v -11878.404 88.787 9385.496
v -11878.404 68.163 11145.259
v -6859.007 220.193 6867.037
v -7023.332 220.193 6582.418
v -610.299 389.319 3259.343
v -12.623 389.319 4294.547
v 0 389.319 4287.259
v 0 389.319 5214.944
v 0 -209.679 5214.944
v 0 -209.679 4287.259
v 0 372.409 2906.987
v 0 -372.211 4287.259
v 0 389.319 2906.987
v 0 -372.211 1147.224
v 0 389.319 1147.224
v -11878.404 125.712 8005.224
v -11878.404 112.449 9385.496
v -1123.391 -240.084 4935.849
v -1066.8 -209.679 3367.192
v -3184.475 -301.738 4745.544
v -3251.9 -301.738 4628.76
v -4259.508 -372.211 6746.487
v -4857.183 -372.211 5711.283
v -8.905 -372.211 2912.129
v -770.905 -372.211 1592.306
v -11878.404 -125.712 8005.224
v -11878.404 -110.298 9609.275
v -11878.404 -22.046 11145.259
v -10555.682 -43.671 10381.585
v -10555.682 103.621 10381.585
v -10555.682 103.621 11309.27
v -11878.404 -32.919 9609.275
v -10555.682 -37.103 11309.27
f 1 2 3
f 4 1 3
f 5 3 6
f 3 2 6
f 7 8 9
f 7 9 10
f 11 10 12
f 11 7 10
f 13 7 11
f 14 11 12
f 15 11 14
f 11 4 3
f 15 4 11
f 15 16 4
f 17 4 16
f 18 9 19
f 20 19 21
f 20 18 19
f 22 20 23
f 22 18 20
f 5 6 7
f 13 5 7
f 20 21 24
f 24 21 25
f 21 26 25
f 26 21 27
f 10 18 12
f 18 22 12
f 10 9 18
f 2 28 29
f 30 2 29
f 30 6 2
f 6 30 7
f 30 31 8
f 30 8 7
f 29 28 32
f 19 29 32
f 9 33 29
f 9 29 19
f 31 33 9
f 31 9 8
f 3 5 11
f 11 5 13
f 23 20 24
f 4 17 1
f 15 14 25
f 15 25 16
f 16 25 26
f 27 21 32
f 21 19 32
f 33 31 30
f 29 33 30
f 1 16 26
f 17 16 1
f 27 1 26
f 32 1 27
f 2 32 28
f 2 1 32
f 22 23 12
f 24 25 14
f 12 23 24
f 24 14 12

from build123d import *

# Parameters (mm, degrees)
BOSS_EXTRUDE1_START = -372.210901238
BOSS_EXTRUDE1_DEPTH = 761.529795247
CUT_EXTRUDE8_DEPTH  = 1524
CUT_EXTRUDE9_DEPTH  = 1524
SKETCH14_W          = 3140.03564449
SKETCH14_H          = 761.529795247
CUT_EXTRUDE10_DEPTH = 6096
SKETCH15_W          = 927.684379614
SKETCH15_H          = 598.997426742
BOSS_EXTRUDE2_DEPTH = 12192
CUT_EXTRUDE11_DEPTH = 2133.6


# Read off the part's stored shape, not the designer's step: Boss-Extrude1
with BuildPart() as part:
    # Boss-Extrude1 outline → Boss-Extrude1 (new body)
    with BuildSketch(Plane(origin=(0, 0, 0), x_dir=(1, 0, 0), z_dir=(0, 1, 0)).offset(BOSS_EXTRUDE1_START)):
        Polygon((0, -4287.259213253), (0, -1147.223568763), (-17157.695299777, -11053.223568763), (-17157.695299777, -14193.259213253), align=None)
    extrude(amount=BOSS_EXTRUDE1_DEPTH)

    # Sketch11 → Cut-Extrude8 (cut)
    with BuildSketch(Plane(origin=(496.762377184, 0, 860.417676572), x_dir=(-0.8660254037844379, 0, 0.5000000000000013), z_dir=(-0.5000000000000013, 0, -0.8660254037844379))):
        Polygon((20385.611784381, 8.553996386), (573.611784381, 389.318894009), (20385.611784381, 389.318894009), align=None)
        Polygon((573.611784381, -389.318894009), (20385.611784381, -389.318894009), (20385.611784381, -8.553996386), align=None)
    extrude(amount=-CUT_EXTRUDE8_DEPTH, mode=Mode.SUBTRACT)

    # Sketch13 → Cut-Extrude9 (cut)
    with BuildSketch(Plane(origin=(1856.437695643, 0, 3215.444409939), x_dir=(0.8660254037844379, 0, -0.5000000000000013), z_dir=(0.5000000000000013, 0, 0.8660254037844379))):
        Polygon((-20103.030058221, -31.301091644), (-2158.205820406, 389.318894009), (-20103.030058221, 389.318894009), align=None)
        Polygon((-20103.123390842, -50.047095366), (-20107.311653405, -470.646228494), (-2163.37704262, -649.329215787), align=None)
    extrude(amount=-CUT_EXTRUDE9_DEPTH, mode=Mode.SUBTRACT)

    # Sketch14 → Cut-Extrude10 (cut, along a direction that is not the sketch's normal)
    with BuildSketch(Plane.ZY.offset(17157.695299777)):
        with Locations((12623.241391008, 8.553996385)):
            Rectangle(SKETCH14_W, SKETCH14_H)
    extrude(amount=-CUT_EXTRUDE10_DEPTH, dir=(-0.8660254037844379, 0, 0.5000000000000014), mode=Mode.SUBTRACT)

    # Sketch15 → Boss-Extrude2 (add, along a direction that is not the sketch's normal)
    with BuildSketch(Plane(origin=(0, 0, 0), x_dir=(0, 0, -1), z_dir=(1, 0, 0))):
        with Locations((-4751.10140306, 89.820180638)):
            Rectangle(SKETCH15_W, SKETCH15_H)
    extrude(amount=-BOSS_EXTRUDE2_DEPTH, dir=(0.8657875976161161, 0.02343319053858119, -0.49986270254470566))

    # Sketch16 → Cut-Extrude11 (cut)
    with BuildSketch(Plane(origin=(2258.136815363, 0, 3911.20769465), x_dir=(0.8660254037844379, 0, -0.5000000000000013), z_dir=(0.5000000000000012, 0, 0.8660254037844378))):
        Polygon((-2607.471796433, -209.678532733), (-24747.672389043, -1017.49242809), (-23543.041613872, 86.741395035), align=None)
    extrude(amount=-CUT_EXTRUDE11_DEPTH, mode=Mode.SUBTRACT)


solid = part.part
